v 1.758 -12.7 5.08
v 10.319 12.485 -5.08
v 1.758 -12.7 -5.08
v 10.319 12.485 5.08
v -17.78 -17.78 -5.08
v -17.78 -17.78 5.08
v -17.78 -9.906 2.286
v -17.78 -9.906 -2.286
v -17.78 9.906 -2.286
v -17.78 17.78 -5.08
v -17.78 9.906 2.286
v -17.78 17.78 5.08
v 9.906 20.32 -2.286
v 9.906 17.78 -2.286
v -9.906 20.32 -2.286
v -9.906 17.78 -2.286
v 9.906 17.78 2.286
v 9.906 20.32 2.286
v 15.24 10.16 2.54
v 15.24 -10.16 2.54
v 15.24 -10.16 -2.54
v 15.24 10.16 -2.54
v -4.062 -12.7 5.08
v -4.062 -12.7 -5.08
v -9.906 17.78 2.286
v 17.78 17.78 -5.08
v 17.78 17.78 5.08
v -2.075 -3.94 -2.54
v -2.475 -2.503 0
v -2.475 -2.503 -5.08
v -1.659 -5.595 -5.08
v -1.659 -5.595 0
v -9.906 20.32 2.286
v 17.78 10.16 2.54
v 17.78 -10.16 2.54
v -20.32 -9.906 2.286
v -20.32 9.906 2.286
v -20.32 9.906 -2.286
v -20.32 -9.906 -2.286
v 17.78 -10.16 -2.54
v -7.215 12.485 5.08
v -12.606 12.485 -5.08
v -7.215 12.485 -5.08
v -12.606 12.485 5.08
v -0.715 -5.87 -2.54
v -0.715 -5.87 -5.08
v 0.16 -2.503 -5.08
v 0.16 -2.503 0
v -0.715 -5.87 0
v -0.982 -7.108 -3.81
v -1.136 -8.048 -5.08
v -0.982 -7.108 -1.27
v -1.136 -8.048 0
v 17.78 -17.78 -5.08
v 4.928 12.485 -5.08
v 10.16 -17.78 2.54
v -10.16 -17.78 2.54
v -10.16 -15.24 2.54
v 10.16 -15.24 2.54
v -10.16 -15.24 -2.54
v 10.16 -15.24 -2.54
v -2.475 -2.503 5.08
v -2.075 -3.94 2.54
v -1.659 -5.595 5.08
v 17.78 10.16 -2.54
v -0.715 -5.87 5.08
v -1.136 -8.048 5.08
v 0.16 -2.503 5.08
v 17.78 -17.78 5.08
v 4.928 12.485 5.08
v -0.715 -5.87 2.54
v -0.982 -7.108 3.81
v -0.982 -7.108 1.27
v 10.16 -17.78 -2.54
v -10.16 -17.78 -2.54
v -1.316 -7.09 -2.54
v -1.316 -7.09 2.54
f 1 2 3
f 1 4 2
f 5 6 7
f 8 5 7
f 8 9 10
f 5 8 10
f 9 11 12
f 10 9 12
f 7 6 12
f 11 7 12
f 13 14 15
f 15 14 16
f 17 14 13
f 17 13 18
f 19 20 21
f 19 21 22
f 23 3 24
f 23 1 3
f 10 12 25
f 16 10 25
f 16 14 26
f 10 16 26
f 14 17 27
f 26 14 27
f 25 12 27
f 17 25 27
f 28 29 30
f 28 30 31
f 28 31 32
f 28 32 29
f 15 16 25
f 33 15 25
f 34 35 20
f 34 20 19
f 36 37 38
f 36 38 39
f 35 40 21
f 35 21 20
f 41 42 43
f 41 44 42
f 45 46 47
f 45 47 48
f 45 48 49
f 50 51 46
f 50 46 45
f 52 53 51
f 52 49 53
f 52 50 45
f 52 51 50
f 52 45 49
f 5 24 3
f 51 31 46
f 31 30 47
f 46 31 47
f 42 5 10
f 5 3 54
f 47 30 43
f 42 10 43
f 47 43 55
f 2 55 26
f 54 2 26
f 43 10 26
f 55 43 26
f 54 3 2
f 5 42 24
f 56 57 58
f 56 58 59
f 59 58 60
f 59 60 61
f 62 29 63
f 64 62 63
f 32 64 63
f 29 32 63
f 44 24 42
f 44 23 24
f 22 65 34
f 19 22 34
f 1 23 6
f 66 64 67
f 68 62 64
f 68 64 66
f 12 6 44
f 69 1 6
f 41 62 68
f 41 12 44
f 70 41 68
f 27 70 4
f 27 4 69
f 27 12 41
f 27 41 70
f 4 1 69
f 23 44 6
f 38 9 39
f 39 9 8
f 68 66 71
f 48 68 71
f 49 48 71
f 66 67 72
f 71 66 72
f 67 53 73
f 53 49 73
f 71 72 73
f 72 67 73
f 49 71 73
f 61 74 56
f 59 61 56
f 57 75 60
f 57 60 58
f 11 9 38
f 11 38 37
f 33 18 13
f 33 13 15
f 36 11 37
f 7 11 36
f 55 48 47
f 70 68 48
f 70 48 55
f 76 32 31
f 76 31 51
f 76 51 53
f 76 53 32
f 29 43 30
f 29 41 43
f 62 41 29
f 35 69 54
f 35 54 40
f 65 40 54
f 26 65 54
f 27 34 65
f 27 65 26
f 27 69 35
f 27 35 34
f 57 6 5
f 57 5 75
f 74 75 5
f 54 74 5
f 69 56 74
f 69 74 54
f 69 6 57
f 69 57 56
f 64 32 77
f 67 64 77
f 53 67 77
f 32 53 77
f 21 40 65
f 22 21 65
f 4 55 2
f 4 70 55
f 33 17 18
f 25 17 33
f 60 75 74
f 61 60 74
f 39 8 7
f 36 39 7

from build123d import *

# Parameters (mm, degrees)
F0_W     = 35.56
F0_H     = 35.56
F1_DEPTH = 5.08
F2_W     = 19.812
F2_H     = 4.572
F3_DEPTH = 2.54
F4_W     = 19.812
F4_H     = 4.572
F5_DEPTH = 2.54
F6_W     = 20.32
F6_H     = 5.08
F7_DEPTH = 2.54
F8_W     = 20.32
F8_H     = 5.08
F9_DEPTH = 2.54


with BuildPart() as f1:
    # F0 (on Top) → F1 (new body, symmetric)
    with BuildSketch(Plane.XY):
        Rectangle(F0_W, F0_H)
        with BuildLine():
            Line((0.1598524306, -2.5025173611), (4.9278645833, 12.4850260417))
            Line((4.9278645833, 12.4850260417), (10.31875, 12.4850260417))
            Line((10.31875, 12.4850260417), (1.7583767361, -12.7))
            Line((1.7583767361, -12.7), (-4.0624565972, -12.7))
            Line((-4.0624565972, -12.7), (-12.6062934028, 12.4850260417))
            Line((-12.6062934028, 12.4850260417), (-7.2154079861, 12.4850260417))
            Line((-7.2154079861, 12.4850260417), (-2.4749565972, -2.5025173611))
            add(Edge.make_bspline(
                [(-2.4749565972, -2.5025173611), (-2.08359375, -3.8309461806), (-1.6591579861, -5.5948350694)],
                knots=[0, 0, 0, 1, 1, 1], degree=2))
            add(Edge.make_bspline(
                [(-1.6591579861, -5.5948350694), (-1.2347222222, -7.3587239583), (-1.1355034722, -8.0477430556)],
                knots=[0, 0, 0, 1, 1, 1], degree=2))
            add(Edge.make_bspline(
                [(-1.1355034722, -8.0477430556), (-0.942578125, -6.4657552083), (0.1598524306, -2.5025173611)],
                knots=[0, 0, 0, 1, 1, 1], degree=2))
        make_face(mode=Mode.SUBTRACT)
    extrude(amount=F1_DEPTH, both=True)

    # F2 (on face) → F3 (join)
    with BuildSketch(Plane(origin=(0, 17.78, 0), x_dir=(-1, 0, 0), z_dir=(0, 1, 0))):
        Rectangle(F2_W, F2_H)
    extrude(amount=F3_DEPTH)

    # F4 (on face) → F5 (join)
    with BuildSketch(Plane(origin=(-17.78, 0, 0), x_dir=(0, -1, 0), z_dir=(-1, 0, 0))):
        Rectangle(F4_W, F4_H)
    extrude(amount=F5_DEPTH)

    # F6 (on face) → F7 (cut)
    with BuildSketch(Plane.XZ.offset(17.78)):
        Rectangle(F6_W, F6_H)
    extrude(amount=-F7_DEPTH, mode=Mode.SUBTRACT)

    # F8 (on face) → F9 (cut)
    with BuildSketch(Plane.YZ.offset(17.78)):
        Rectangle(F8_W, F8_H)
    extrude(amount=-F9_DEPTH, mode=Mode.SUBTRACT)


solid = f1.part
